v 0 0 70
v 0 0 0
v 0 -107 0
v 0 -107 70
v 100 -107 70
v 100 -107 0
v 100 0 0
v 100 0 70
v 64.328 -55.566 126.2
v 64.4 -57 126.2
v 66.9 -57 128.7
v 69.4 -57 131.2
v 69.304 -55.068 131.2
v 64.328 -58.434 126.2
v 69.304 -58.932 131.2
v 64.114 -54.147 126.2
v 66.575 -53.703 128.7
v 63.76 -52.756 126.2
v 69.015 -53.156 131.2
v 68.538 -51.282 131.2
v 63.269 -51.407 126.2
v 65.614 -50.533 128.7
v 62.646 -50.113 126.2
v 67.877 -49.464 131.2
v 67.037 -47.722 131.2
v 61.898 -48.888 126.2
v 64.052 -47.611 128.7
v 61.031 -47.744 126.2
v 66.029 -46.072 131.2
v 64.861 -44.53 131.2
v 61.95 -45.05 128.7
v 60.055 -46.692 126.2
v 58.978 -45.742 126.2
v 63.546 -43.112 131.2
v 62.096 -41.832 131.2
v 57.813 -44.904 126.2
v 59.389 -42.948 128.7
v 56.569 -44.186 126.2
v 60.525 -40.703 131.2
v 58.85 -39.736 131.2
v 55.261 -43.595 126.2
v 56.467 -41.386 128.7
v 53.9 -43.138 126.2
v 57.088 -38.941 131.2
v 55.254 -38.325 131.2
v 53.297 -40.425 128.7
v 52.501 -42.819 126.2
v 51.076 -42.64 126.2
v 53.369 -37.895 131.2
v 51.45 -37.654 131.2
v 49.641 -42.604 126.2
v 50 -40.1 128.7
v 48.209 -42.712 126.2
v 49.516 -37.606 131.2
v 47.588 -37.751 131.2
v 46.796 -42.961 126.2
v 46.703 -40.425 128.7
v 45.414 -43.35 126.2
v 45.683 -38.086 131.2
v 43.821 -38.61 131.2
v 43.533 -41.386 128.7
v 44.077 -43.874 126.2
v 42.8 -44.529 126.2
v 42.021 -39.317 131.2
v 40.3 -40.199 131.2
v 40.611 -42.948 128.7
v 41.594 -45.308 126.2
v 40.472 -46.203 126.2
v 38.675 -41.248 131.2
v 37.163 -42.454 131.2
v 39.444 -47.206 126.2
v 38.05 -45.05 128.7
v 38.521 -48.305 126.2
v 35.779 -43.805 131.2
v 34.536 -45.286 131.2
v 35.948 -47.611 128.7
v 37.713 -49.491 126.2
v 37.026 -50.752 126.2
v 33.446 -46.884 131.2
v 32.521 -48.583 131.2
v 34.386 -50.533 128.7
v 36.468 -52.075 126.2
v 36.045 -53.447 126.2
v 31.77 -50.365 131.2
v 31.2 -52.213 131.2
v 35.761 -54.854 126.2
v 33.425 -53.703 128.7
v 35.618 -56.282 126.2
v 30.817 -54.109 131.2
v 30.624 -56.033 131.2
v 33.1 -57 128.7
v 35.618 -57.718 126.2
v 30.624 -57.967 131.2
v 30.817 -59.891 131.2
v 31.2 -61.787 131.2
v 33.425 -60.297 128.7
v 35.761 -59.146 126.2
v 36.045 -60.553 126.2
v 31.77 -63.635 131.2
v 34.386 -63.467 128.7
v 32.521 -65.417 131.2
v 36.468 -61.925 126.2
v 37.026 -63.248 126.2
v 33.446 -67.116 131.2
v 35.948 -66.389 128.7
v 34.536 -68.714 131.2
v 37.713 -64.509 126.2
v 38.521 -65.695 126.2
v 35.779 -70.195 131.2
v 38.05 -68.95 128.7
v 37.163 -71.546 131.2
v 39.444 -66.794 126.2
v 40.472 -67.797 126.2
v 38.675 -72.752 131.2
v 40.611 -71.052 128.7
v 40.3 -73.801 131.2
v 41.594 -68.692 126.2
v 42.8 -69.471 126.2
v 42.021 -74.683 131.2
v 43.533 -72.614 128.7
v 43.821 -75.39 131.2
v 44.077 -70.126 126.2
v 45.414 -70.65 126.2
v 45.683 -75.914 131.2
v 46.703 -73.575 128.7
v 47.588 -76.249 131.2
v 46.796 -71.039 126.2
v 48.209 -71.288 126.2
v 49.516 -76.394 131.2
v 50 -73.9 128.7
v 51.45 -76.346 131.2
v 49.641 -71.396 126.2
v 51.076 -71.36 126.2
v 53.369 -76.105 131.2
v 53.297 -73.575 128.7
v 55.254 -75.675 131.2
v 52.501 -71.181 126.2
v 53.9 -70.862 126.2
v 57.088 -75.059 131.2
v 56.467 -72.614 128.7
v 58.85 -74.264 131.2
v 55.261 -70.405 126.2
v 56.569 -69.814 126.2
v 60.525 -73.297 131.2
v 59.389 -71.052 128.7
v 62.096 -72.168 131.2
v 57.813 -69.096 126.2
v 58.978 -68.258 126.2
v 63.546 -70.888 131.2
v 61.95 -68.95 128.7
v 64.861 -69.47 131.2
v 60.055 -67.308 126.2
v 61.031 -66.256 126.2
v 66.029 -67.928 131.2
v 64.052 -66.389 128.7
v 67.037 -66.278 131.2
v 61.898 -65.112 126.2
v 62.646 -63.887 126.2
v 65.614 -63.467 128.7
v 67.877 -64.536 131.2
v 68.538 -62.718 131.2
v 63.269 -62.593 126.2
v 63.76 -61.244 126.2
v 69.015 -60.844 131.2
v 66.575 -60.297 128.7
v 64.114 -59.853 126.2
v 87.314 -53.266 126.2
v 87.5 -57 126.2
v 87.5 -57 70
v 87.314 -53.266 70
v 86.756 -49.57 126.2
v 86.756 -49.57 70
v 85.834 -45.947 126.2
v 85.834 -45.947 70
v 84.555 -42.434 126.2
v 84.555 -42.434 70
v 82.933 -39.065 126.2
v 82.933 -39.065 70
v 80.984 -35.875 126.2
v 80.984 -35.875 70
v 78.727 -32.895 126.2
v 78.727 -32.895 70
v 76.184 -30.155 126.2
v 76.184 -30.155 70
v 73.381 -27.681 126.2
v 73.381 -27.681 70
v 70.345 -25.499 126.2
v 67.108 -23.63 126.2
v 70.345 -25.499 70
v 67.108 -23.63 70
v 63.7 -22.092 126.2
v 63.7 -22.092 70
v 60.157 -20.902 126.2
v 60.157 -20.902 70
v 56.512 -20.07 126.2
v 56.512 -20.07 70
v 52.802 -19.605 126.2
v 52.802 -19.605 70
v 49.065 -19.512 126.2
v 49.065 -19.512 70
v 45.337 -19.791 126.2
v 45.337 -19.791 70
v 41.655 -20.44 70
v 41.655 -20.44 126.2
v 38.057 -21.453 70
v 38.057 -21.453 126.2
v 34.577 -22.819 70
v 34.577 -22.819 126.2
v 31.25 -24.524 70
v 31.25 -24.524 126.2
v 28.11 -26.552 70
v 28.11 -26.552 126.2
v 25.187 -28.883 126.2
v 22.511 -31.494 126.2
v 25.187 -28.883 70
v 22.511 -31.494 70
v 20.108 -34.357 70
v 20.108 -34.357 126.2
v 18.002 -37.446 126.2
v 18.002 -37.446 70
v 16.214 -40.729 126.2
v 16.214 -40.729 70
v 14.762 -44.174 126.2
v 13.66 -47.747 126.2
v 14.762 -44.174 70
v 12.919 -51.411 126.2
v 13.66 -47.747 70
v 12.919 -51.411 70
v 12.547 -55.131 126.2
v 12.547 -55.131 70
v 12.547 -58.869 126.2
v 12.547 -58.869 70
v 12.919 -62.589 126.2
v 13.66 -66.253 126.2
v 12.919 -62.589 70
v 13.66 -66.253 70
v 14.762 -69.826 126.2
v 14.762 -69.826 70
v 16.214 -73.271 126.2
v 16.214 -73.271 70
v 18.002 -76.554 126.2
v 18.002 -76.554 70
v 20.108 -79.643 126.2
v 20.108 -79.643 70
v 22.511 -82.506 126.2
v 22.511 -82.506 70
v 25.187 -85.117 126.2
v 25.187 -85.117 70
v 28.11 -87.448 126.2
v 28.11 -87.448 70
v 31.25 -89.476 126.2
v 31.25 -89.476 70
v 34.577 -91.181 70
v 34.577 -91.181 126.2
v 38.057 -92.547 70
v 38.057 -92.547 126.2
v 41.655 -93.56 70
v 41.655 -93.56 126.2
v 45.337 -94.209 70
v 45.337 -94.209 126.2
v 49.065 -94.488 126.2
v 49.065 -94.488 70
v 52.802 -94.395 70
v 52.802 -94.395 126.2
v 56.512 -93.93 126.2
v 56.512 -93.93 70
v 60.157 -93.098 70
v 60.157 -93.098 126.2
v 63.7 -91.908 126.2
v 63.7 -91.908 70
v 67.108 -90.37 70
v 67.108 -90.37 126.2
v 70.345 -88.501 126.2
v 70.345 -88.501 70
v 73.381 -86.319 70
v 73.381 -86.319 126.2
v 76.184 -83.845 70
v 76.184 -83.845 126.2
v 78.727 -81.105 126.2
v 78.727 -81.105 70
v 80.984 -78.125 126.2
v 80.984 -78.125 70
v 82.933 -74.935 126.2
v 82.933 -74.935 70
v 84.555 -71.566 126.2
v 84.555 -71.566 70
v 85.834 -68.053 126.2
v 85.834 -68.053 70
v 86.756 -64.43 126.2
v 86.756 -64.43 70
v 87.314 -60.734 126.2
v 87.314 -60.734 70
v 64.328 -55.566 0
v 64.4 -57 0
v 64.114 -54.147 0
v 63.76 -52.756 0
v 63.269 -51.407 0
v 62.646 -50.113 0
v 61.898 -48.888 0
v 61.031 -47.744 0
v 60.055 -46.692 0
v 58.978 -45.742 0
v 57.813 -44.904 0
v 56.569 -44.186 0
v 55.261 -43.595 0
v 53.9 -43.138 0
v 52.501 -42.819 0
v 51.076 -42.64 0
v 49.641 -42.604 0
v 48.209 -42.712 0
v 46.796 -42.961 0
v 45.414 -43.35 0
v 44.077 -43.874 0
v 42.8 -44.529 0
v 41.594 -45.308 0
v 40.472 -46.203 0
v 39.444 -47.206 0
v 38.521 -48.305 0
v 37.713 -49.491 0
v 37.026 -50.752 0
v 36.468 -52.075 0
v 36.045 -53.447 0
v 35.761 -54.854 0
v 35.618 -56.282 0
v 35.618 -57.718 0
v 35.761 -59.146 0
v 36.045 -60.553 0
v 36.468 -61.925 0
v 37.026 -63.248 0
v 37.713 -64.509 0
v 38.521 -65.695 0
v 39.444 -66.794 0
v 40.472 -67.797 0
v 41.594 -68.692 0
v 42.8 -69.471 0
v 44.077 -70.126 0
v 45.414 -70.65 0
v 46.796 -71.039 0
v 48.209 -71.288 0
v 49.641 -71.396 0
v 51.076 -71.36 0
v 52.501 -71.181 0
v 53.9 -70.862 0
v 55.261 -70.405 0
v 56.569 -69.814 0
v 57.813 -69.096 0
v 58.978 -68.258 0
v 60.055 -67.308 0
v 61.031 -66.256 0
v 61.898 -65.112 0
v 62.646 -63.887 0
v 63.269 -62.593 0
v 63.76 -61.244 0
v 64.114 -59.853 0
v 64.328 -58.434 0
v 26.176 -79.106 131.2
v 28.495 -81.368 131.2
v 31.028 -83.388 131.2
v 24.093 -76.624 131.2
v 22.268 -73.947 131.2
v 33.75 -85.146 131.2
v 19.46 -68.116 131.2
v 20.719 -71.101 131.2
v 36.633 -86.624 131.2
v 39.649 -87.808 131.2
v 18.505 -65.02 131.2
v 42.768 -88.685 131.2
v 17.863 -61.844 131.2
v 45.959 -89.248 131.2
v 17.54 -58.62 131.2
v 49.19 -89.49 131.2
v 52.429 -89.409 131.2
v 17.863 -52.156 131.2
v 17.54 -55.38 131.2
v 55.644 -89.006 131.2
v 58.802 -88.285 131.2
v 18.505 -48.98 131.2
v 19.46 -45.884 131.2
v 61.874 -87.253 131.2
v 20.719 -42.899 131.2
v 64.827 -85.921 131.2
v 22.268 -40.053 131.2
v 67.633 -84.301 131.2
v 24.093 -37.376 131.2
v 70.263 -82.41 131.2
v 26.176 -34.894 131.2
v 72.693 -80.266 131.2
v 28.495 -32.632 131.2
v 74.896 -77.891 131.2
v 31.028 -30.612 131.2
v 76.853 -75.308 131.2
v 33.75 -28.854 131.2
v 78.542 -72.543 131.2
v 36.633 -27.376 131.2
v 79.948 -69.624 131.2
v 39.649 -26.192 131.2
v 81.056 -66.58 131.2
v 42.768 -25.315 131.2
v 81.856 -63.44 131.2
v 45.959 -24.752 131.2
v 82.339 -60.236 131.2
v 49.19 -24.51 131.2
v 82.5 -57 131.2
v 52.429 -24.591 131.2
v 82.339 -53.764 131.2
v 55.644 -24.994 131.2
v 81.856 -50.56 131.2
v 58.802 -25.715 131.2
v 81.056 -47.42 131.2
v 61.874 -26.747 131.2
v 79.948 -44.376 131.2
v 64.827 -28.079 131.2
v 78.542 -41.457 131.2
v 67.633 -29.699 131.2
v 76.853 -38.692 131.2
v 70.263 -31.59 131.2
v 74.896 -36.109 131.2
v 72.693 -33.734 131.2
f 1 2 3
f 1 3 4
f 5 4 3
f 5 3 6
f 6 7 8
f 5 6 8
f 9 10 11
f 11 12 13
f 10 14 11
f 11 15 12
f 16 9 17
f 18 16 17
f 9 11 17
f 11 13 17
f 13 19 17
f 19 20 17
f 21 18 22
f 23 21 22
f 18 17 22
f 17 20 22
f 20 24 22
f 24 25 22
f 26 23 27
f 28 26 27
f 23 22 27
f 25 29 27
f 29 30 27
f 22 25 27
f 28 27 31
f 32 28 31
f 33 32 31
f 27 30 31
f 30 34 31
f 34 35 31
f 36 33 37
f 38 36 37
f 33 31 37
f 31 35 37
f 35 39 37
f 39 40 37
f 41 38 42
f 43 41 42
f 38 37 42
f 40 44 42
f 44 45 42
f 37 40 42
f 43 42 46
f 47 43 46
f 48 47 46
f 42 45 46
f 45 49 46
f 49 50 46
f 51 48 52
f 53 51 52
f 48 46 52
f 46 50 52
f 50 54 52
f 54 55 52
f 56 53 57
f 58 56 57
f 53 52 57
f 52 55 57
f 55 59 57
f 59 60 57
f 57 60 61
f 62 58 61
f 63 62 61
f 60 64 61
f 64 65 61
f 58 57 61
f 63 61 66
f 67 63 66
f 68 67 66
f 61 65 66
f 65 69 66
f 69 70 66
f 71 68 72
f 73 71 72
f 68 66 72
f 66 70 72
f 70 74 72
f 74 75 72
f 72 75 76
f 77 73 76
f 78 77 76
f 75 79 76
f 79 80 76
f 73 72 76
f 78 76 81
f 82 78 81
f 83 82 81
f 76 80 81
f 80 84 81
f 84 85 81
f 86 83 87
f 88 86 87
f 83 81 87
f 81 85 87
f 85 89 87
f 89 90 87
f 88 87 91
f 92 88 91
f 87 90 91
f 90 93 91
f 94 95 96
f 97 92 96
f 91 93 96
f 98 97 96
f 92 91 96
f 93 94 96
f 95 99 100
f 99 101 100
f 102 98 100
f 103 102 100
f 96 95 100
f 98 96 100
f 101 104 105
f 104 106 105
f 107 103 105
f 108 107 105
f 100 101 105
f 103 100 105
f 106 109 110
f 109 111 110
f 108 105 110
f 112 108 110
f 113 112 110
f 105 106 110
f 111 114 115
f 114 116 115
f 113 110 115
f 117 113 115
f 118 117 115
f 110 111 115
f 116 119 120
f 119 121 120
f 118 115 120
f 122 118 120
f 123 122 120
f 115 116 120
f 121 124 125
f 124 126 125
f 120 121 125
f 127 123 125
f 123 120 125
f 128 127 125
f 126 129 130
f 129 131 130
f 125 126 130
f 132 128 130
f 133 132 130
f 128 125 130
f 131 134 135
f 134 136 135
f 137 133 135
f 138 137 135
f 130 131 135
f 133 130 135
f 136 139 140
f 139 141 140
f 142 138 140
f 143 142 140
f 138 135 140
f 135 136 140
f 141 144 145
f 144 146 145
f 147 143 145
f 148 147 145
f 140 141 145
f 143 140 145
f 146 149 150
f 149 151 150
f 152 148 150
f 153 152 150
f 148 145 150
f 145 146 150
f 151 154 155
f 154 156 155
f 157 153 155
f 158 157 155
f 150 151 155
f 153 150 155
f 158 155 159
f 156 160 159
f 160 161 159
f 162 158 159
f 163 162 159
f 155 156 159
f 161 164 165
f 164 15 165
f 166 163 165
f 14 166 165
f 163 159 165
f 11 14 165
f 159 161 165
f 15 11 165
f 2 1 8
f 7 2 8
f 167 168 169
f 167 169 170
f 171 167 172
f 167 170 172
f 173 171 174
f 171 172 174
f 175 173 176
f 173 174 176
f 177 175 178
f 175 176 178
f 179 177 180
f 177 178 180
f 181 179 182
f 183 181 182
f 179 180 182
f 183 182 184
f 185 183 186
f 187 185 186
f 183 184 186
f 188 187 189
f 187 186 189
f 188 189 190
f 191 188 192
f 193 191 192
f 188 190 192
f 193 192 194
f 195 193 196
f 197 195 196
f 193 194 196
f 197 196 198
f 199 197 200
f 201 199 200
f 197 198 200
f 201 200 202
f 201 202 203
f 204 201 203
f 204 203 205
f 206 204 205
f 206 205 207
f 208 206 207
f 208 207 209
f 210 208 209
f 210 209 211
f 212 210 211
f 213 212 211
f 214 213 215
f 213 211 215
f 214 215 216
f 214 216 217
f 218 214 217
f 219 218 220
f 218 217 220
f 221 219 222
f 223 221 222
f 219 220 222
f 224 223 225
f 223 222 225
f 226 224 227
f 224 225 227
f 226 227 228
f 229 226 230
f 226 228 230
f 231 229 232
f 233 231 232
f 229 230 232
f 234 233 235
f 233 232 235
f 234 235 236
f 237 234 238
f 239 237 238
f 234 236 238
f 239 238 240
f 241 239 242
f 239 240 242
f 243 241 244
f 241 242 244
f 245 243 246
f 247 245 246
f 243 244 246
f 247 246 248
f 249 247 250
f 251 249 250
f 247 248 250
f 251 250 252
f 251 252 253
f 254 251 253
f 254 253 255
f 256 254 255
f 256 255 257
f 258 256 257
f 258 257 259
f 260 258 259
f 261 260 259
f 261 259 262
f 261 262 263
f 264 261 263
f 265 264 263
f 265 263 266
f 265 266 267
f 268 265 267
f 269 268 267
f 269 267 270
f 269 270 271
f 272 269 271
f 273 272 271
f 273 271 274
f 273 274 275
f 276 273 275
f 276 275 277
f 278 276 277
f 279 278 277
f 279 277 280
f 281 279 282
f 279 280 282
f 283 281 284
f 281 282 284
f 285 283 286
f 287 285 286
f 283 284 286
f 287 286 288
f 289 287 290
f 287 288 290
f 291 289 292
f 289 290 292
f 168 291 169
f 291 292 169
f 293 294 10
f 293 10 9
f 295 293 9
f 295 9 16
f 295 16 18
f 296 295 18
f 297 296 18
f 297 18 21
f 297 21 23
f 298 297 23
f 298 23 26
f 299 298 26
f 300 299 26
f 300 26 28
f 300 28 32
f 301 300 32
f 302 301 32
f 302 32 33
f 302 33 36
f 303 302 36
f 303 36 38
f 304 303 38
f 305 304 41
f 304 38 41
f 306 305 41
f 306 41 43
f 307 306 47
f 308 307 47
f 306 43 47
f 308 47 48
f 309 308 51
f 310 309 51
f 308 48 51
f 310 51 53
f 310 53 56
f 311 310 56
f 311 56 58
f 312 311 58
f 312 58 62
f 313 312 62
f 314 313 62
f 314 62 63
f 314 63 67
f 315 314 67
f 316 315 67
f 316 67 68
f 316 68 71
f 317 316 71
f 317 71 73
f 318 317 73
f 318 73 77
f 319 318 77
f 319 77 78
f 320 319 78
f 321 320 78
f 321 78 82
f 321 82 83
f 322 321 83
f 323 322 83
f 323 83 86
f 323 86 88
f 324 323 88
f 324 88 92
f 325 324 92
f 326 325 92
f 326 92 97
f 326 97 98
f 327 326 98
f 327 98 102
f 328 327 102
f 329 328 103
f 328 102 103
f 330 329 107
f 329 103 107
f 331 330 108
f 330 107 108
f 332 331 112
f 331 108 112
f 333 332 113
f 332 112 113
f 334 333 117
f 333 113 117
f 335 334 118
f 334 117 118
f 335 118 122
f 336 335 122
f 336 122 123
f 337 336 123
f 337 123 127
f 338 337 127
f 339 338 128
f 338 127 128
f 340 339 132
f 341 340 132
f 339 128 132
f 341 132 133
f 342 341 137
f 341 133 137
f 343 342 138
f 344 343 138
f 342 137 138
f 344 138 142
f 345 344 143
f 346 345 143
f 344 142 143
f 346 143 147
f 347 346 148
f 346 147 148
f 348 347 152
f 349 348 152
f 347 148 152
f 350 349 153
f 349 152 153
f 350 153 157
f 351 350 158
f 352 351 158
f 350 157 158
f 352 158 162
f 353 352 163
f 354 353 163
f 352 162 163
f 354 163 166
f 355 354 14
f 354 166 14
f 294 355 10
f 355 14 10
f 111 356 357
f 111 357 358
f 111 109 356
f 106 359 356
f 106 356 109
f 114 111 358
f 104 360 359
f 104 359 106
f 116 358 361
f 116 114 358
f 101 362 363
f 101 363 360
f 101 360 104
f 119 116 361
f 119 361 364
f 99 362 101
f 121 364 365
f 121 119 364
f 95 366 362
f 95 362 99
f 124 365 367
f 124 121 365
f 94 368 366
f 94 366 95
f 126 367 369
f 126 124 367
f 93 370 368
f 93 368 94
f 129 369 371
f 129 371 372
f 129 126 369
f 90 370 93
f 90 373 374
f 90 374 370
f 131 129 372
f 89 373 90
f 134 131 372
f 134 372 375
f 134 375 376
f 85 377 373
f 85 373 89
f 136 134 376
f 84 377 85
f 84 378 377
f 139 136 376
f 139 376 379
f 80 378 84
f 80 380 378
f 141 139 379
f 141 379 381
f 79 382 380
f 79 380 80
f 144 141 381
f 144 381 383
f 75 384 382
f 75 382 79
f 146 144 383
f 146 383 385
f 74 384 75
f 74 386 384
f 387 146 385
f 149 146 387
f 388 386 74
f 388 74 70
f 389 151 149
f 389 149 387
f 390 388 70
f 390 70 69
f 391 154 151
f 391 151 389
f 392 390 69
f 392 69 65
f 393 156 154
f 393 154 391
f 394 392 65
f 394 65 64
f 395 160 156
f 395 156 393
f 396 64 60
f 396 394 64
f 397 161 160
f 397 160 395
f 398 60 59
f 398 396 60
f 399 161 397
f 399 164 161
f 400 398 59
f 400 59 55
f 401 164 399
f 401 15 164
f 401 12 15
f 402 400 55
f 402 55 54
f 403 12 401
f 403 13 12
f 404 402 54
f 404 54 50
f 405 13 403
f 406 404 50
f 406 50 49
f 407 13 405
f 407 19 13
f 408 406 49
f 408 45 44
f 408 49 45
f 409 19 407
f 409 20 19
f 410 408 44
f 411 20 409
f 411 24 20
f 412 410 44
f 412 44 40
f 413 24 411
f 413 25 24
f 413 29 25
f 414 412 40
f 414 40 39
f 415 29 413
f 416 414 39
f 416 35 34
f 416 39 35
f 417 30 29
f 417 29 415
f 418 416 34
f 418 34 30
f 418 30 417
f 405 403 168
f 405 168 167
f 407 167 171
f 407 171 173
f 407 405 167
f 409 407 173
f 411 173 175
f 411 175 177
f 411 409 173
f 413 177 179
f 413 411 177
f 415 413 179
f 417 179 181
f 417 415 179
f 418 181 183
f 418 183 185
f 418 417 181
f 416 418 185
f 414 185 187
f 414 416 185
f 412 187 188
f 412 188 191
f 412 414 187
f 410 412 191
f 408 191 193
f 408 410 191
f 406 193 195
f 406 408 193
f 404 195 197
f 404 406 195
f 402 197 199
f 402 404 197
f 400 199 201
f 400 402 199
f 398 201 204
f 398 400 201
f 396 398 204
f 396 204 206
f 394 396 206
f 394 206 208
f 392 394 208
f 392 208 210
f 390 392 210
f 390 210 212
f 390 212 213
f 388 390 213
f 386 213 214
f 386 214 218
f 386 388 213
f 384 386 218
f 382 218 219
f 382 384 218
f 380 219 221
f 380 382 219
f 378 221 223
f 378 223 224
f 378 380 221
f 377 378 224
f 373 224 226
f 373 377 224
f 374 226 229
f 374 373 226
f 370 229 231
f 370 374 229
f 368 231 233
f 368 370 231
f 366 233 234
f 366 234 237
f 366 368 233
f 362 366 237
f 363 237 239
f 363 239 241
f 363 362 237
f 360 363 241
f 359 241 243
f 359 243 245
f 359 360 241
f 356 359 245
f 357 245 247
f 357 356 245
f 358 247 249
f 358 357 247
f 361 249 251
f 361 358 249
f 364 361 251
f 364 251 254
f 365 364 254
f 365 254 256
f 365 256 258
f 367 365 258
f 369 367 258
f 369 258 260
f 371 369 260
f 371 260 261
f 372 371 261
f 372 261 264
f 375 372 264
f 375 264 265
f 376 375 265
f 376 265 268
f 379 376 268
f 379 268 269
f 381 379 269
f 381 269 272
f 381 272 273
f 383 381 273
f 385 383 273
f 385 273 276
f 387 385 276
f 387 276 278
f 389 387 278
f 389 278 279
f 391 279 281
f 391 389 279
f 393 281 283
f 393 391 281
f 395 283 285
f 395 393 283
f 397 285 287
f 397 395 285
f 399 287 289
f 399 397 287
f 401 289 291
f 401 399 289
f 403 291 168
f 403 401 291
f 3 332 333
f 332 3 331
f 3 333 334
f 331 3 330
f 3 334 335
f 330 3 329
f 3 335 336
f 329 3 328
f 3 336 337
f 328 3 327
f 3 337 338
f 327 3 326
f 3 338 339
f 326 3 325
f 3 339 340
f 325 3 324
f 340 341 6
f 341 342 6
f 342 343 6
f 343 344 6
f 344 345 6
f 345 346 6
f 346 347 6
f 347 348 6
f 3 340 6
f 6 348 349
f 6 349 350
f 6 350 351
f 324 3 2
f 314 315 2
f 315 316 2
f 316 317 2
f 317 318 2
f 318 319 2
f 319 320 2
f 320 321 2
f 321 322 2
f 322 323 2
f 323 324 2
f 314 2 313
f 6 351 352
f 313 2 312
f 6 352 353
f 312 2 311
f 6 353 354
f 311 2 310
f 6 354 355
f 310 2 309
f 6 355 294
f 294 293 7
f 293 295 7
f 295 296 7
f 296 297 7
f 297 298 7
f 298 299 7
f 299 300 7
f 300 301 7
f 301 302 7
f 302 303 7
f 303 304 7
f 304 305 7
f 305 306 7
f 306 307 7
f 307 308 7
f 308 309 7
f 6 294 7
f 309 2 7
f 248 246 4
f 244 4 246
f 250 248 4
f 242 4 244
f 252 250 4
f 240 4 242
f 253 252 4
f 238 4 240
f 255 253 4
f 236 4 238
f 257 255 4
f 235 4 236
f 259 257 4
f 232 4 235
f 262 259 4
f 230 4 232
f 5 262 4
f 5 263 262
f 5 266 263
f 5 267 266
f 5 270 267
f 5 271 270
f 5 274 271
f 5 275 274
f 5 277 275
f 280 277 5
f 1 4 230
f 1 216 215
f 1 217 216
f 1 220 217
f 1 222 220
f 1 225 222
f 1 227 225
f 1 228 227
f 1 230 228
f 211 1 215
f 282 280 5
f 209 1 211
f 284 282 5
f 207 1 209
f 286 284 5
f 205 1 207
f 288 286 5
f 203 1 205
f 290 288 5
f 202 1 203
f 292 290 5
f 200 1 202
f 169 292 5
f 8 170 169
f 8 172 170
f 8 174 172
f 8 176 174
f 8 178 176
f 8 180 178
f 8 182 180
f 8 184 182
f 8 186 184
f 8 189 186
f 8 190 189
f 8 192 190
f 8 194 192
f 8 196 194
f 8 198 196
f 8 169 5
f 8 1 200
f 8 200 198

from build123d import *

# Parameters (mm, degrees)
F0_W     = 100
F0_H     = 70
F1_DEPTH = 107
F2_R     = 37.5
F3_DEPTH = 61.2
F4_R     = 14.4000008702
F5_DEPTH = 131.201
F6_SIZE  = 5


with BuildPart() as f1:
    # F0 (on Front) → F1 (new body)
    with BuildSketch(Plane.XZ):
        with Locations((50, 35)):
            Rectangle(F0_W, F0_H)
    extrude(amount=F1_DEPTH)

    # F2 (on face) → F3 (join)
    with BuildSketch(Plane.XY.offset(70)):
        with Locations((50, -57)):
            Circle(F2_R)
    extrude(amount=F3_DEPTH)

    # F4 (on face) → F5 (cut, through all)
    with BuildSketch(Plane.XY.offset(131.2)):
        with Locations((50, -57)):
            Circle(F4_R)
    extrude(amount=-F5_DEPTH, mode=Mode.SUBTRACT)

    # F6
    f6_edges = [f1.edges().sort_by_distance(p)[0] for p in [
        (12.5, -57, 131.2),
        (35.599999, -57, 131.2),
    ]]
    chamfer(f6_edges, length=F6_SIZE)


solid = f1.part
